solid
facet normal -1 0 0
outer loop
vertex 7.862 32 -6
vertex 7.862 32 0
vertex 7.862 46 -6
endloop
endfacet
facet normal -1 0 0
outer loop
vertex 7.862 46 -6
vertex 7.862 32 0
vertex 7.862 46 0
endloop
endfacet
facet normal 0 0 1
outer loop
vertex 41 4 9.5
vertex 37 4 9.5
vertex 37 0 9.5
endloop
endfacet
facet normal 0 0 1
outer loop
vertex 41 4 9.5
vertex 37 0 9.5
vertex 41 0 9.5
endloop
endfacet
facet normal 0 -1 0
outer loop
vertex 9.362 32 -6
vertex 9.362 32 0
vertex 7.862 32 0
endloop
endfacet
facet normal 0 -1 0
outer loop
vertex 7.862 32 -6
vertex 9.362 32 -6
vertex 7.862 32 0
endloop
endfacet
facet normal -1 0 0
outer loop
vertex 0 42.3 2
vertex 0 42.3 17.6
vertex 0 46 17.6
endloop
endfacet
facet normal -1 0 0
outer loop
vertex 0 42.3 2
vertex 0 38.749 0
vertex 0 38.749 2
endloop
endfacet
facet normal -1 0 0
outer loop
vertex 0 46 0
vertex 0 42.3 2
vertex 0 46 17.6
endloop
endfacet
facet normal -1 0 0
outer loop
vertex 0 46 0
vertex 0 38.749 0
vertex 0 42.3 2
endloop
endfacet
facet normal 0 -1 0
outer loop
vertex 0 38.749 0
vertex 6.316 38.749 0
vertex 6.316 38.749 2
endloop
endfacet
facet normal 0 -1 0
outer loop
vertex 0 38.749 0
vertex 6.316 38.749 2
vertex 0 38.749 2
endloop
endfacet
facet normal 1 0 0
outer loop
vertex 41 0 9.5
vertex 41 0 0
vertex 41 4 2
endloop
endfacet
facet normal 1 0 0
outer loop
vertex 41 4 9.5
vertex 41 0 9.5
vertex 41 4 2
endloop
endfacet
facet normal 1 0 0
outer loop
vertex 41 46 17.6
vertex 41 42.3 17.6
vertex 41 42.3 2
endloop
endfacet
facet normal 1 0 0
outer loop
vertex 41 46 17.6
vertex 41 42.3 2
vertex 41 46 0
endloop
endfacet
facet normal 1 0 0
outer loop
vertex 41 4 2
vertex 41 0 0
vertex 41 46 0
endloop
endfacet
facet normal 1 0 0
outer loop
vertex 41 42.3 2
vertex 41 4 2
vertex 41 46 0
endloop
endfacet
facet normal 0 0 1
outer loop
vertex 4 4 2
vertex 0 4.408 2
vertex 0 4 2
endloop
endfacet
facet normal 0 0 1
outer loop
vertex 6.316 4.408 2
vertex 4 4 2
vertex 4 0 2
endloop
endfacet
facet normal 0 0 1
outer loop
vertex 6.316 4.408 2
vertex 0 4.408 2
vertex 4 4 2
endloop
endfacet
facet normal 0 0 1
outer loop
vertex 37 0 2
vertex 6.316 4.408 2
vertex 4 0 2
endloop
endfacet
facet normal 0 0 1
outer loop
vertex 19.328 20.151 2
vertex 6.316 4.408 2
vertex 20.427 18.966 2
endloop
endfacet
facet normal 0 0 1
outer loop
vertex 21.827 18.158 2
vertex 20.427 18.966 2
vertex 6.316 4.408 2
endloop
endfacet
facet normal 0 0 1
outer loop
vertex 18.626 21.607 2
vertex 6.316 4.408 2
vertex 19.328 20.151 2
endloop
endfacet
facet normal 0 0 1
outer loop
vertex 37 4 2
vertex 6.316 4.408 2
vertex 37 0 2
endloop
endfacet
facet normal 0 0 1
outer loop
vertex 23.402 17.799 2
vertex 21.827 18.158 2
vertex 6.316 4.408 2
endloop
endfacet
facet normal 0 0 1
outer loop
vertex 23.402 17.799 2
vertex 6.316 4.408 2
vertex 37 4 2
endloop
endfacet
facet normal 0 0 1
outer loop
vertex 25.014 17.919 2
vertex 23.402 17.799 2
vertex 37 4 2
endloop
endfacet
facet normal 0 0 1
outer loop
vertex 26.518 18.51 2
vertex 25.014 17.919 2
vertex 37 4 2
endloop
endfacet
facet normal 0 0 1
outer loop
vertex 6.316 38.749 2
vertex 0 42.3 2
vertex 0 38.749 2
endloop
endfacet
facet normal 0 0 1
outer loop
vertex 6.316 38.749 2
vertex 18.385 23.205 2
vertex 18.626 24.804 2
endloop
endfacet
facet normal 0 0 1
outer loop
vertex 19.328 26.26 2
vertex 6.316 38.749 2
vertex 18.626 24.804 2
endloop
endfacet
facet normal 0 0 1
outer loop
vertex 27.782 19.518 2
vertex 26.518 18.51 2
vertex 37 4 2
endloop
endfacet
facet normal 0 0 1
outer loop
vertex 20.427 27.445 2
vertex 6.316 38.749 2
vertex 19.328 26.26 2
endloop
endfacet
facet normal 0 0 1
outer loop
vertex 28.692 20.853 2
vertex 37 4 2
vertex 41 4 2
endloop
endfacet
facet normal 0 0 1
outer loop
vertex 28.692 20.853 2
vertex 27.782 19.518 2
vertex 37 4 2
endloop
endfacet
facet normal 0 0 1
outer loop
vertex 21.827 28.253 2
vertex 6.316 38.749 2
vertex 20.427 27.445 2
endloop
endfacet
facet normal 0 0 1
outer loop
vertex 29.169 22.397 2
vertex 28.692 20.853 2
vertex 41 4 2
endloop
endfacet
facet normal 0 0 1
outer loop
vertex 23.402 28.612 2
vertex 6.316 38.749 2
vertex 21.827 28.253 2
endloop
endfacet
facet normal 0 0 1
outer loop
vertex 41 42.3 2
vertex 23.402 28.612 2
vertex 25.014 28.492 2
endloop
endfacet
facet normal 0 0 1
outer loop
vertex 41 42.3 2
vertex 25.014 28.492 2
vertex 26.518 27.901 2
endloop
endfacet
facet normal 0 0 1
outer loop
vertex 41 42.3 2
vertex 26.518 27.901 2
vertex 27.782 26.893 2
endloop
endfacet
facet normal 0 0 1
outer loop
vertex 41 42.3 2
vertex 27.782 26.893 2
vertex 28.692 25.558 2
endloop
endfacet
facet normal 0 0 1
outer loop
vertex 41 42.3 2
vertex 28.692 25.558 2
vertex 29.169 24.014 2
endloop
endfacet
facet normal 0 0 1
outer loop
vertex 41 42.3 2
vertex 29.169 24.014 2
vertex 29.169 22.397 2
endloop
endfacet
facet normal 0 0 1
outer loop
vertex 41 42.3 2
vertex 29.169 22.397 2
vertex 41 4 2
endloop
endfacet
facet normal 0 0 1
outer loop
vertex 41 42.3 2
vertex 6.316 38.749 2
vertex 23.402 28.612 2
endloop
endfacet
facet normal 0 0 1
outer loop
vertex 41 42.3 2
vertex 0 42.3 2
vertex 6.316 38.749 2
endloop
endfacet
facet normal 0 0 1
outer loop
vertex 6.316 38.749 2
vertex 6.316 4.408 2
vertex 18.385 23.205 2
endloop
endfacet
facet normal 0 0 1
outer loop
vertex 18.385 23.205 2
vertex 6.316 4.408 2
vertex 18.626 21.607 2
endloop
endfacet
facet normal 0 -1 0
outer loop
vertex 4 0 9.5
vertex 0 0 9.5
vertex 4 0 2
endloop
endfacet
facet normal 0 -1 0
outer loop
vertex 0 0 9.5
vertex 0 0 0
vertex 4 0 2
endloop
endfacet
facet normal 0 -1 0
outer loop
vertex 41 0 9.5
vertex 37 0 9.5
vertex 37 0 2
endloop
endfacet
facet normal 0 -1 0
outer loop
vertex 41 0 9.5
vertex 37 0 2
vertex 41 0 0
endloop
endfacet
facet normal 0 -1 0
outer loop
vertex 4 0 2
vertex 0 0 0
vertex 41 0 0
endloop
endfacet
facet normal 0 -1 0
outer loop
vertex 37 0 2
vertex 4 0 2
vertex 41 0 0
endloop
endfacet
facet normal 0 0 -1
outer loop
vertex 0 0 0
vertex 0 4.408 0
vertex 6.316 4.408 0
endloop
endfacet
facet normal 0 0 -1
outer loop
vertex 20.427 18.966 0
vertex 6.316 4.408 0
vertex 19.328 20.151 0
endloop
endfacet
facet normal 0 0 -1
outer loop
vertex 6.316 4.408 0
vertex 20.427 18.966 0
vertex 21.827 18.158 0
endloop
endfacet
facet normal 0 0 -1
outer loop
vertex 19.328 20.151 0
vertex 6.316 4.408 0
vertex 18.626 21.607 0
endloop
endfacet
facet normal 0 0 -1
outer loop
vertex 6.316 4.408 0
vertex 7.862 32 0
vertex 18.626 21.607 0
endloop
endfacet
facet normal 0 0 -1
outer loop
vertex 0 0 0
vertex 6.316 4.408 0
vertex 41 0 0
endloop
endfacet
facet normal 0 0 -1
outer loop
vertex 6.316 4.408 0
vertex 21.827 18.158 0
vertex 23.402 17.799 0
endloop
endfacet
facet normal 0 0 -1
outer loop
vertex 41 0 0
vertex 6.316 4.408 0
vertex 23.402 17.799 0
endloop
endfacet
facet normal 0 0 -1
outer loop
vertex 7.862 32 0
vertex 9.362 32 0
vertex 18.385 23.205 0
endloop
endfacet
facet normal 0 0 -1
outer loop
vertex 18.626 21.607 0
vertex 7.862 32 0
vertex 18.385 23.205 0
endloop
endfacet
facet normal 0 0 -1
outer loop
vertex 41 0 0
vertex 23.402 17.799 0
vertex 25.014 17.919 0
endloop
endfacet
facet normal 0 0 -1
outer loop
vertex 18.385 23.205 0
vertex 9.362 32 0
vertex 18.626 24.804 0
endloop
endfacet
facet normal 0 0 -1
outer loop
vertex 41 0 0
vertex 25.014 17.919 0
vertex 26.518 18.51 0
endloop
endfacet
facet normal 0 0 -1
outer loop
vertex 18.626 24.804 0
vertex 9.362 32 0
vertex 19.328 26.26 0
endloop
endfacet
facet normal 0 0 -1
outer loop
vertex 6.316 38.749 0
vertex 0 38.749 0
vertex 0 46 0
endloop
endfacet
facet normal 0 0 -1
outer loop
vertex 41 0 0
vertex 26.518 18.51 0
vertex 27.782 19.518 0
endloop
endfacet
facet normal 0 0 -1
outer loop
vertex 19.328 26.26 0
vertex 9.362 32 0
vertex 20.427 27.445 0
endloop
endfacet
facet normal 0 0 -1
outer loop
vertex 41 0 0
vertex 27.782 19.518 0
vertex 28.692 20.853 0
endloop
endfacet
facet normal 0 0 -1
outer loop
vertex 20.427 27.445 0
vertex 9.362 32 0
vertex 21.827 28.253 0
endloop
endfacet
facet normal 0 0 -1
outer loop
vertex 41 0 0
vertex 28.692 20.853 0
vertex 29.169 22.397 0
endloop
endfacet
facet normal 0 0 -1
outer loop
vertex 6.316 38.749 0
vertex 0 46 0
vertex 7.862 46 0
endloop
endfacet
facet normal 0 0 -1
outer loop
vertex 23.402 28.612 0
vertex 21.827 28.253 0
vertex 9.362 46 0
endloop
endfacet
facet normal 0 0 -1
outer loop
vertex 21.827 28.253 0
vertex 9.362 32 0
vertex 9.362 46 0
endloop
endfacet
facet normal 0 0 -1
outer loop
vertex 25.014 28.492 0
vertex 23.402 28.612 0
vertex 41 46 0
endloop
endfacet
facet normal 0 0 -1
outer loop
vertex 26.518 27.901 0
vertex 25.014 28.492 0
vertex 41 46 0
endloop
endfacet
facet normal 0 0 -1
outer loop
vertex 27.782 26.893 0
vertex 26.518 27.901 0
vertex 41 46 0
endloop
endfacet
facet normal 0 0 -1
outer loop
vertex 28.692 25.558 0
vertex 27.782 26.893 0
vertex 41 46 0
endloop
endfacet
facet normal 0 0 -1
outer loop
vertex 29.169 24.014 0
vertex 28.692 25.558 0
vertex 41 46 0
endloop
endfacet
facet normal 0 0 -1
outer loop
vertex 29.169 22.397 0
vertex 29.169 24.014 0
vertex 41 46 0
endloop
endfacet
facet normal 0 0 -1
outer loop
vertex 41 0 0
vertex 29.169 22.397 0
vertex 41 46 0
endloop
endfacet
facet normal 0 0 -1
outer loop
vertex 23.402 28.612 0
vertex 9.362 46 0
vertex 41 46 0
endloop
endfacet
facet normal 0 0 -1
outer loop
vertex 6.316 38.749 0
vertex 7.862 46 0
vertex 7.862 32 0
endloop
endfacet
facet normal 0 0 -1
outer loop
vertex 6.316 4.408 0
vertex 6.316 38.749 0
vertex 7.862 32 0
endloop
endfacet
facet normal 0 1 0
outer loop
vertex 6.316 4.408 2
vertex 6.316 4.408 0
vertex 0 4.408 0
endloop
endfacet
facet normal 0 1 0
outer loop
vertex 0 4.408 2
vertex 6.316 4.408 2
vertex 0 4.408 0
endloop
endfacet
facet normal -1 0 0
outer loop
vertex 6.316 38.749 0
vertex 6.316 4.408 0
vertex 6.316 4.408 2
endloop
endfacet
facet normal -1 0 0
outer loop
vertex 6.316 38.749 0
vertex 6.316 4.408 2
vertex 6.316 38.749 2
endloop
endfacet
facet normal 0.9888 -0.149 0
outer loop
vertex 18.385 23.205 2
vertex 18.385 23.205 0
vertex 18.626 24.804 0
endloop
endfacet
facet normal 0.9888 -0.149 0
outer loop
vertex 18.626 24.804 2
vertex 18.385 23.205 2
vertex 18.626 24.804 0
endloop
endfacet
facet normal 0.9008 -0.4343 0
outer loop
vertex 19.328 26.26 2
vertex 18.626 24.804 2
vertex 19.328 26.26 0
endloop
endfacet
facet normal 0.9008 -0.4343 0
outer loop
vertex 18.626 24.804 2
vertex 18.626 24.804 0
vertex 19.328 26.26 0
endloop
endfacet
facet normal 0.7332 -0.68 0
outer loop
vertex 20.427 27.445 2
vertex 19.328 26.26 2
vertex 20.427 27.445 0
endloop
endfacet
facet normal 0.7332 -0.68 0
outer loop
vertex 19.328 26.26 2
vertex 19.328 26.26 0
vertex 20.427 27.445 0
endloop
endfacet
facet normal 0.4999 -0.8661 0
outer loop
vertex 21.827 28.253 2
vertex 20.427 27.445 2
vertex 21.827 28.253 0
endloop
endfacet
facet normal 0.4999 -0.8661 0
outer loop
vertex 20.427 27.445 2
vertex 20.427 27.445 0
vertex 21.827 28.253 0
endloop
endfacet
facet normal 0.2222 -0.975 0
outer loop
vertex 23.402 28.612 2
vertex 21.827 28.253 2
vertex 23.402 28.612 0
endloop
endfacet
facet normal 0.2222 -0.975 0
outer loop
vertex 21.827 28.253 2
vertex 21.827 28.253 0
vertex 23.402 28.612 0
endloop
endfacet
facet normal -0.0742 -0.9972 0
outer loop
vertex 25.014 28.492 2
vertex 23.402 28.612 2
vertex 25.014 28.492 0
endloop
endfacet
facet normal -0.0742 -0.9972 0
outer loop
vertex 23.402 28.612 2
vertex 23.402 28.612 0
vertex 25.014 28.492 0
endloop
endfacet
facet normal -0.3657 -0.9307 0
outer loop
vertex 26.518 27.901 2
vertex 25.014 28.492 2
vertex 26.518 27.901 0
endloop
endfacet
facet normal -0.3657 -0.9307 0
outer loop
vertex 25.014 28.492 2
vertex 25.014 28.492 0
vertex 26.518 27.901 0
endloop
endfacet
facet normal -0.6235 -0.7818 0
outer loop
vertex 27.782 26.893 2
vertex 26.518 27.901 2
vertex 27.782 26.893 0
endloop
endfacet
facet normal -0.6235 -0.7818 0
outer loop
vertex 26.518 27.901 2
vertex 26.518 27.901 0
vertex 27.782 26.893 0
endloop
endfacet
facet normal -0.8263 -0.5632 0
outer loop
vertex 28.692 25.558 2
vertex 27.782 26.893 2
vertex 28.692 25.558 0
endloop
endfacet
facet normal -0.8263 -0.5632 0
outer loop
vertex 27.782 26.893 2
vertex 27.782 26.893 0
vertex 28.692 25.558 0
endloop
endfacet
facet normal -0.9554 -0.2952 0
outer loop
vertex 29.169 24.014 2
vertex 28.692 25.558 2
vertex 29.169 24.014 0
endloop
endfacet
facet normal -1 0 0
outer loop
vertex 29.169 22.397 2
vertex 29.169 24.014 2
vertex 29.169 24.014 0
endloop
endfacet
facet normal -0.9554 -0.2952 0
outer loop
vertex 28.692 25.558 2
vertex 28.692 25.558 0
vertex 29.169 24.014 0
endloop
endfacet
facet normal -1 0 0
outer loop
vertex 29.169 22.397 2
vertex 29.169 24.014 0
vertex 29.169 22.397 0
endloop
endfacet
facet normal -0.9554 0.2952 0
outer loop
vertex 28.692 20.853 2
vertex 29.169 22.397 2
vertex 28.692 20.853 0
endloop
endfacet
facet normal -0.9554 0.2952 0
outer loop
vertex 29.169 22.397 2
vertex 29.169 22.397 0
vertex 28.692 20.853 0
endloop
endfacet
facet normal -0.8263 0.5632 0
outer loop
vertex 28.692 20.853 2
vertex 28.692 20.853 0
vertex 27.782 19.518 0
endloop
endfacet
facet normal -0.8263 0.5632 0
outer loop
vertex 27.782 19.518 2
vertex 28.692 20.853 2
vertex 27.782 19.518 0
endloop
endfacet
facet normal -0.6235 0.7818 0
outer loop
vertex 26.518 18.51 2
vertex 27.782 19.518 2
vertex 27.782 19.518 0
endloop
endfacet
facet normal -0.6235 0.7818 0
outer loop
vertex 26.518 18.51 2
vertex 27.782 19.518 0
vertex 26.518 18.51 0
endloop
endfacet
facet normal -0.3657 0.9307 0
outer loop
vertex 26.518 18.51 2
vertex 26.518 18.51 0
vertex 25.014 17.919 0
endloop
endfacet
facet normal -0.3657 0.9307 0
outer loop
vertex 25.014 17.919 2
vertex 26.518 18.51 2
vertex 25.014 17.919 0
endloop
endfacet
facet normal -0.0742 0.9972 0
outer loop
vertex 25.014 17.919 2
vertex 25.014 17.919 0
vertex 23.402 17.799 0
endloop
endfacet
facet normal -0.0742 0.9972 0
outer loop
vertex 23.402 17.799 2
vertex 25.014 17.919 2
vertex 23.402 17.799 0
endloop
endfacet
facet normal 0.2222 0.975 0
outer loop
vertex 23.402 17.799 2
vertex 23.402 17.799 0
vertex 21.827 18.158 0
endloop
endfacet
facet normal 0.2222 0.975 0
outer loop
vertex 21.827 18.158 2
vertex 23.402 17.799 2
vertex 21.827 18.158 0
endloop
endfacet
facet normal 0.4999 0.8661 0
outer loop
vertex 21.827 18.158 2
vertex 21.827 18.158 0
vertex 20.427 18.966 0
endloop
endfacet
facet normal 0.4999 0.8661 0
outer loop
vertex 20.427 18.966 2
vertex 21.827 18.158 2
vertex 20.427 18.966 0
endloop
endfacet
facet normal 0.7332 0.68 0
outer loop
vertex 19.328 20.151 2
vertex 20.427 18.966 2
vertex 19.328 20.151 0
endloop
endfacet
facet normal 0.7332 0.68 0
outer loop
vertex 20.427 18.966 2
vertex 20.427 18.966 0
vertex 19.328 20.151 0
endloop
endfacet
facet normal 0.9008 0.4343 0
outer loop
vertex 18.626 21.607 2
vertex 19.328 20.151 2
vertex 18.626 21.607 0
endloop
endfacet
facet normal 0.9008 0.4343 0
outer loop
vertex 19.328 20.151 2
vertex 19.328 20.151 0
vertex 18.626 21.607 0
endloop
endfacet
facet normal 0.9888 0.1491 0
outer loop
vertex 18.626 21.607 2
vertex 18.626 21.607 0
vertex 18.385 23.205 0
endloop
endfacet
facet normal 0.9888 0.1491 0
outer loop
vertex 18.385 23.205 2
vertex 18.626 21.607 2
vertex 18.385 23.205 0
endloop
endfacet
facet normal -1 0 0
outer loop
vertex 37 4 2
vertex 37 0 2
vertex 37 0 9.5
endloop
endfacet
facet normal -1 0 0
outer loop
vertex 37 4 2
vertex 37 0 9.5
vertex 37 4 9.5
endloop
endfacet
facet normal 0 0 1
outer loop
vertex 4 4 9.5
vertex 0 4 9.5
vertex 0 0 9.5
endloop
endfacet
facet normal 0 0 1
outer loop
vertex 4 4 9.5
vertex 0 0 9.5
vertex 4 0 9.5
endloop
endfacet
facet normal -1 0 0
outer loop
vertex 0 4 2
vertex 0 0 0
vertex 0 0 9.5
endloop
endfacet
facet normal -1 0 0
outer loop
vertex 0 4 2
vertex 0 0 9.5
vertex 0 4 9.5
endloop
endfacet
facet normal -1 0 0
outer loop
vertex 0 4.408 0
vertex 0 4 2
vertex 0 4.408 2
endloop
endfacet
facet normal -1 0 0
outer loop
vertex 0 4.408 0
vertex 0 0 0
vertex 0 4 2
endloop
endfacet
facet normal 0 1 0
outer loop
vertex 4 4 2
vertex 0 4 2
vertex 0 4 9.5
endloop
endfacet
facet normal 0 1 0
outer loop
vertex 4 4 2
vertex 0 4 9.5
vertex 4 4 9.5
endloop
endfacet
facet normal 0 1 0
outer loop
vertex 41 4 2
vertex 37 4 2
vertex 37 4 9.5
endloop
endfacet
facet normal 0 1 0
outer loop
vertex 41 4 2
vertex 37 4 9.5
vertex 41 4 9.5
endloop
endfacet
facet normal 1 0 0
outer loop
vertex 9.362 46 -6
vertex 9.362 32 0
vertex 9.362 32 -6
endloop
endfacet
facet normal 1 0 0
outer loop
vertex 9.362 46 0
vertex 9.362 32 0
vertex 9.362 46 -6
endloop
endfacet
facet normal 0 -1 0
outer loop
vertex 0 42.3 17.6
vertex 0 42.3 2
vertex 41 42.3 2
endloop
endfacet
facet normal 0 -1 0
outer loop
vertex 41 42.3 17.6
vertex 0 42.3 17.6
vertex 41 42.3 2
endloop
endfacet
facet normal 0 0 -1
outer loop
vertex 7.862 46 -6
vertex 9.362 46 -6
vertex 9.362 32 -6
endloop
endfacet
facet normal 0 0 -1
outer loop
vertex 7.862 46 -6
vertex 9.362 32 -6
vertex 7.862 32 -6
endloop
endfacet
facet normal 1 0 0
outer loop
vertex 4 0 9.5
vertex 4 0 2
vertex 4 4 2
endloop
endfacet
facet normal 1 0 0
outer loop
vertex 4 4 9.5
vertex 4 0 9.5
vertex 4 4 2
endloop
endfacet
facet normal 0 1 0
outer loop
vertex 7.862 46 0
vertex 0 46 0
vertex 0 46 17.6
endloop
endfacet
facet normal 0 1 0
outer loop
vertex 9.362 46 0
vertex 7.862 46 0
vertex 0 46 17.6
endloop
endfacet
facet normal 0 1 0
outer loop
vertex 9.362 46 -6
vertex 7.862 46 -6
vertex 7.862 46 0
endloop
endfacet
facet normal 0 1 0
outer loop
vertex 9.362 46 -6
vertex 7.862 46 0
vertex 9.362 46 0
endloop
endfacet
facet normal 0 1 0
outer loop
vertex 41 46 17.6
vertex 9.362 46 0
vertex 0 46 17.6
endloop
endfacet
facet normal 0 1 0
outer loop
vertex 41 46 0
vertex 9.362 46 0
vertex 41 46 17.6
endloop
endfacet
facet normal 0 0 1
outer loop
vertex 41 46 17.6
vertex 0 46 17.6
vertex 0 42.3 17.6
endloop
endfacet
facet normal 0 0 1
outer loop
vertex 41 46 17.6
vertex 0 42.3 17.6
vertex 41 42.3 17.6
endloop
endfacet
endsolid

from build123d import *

# Parameters (mm, degrees)
SCHIZZO1_W                   = 41
SCHIZZO1_H                   = 46
ESTRUSIONE_ESTRUSIONE1_DEPTH = 2
SCHIZZO2_W                   = 4
SCHIZZO2_H                   = 4
ESTRUSIONE_ESTRUSIONE2_DEPTH = 7.5
SCHIZZO3_W                   = 41
SCHIZZO3_H                   = 3.7
ESTRUSIONE_ESTRUSIONE3_DEPTH = 15.6
SCHIZZO4_W                   = 6.315683346
SCHIZZO4_H                   = 34.34145986
TAGLIO_ESTRUSIONE1_DEPTH     = 2
SCHIZZO5_W                   = 1.5
SCHIZZO5_H                   = 14
ESTRUSIONE_ESTRUSIONE4_DEPTH = 6
SCHIZZO7_R                   = 5.421973109
TAGLIO_ESTRUSIONE3_DEPTH     = 2


with BuildPart() as part:
    # Schizzo1 → Estrusione-Estrusione1 (new body)
    with BuildSketch(Plane.XY):
        with Locations((20.5, 23)):
            Rectangle(SCHIZZO1_W, SCHIZZO1_H)
    extrude(amount=ESTRUSIONE_ESTRUSIONE1_DEPTH)

    # Schizzo2 → Estrusione-Estrusione2 (add)
    with BuildSketch(Plane.XY.offset(2)):
        with Locations((2, 2)):
            Rectangle(SCHIZZO2_W, SCHIZZO2_H)
        with Locations((39, 2)):
            Rectangle(SCHIZZO2_W, SCHIZZO2_H)
    extrude(amount=ESTRUSIONE_ESTRUSIONE2_DEPTH)

    # Schizzo3 → Estrusione-Estrusione3 (add)
    with BuildSketch(Plane.XY.offset(2)):
        with Locations((20.5, 44.15)):
            Rectangle(SCHIZZO3_W, SCHIZZO3_H)
    extrude(amount=ESTRUSIONE_ESTRUSIONE3_DEPTH)

    # Schizzo4 → Taglio-Estrusione1 (cut)
    with BuildSketch(Plane(origin=(0, 0, 0), x_dir=(-1, 0, 0), z_dir=(0, 0, -1))):
        with Locations((-3.157841673, 21.578763697)):
            Rectangle(SCHIZZO4_W, SCHIZZO4_H)
    extrude(amount=-TAGLIO_ESTRUSIONE1_DEPTH, mode=Mode.SUBTRACT)

    # Schizzo5 → Estrusione-Estrusione4 (add)
    with BuildSketch(Plane(origin=(0, 0, 0), x_dir=(-1, 0, 0), z_dir=(0, 0, -1))):
        with Locations((-8.611501058, 39)):
            Rectangle(SCHIZZO5_W, SCHIZZO5_H)
    extrude(amount=ESTRUSIONE_ESTRUSIONE4_DEPTH)

    # Schizzo7 → Taglio-Estrusione3 (cut)
    with BuildSketch(Plane(origin=(0, 0, 0), x_dir=(-1, 0, 0), z_dir=(0, 0, -1))):
        with Locations((-23.8073986, 23.20549075)):
            Circle(SCHIZZO7_R)
    extrude(amount=-TAGLIO_ESTRUSIONE3_DEPTH, mode=Mode.SUBTRACT)


solid = part.part
